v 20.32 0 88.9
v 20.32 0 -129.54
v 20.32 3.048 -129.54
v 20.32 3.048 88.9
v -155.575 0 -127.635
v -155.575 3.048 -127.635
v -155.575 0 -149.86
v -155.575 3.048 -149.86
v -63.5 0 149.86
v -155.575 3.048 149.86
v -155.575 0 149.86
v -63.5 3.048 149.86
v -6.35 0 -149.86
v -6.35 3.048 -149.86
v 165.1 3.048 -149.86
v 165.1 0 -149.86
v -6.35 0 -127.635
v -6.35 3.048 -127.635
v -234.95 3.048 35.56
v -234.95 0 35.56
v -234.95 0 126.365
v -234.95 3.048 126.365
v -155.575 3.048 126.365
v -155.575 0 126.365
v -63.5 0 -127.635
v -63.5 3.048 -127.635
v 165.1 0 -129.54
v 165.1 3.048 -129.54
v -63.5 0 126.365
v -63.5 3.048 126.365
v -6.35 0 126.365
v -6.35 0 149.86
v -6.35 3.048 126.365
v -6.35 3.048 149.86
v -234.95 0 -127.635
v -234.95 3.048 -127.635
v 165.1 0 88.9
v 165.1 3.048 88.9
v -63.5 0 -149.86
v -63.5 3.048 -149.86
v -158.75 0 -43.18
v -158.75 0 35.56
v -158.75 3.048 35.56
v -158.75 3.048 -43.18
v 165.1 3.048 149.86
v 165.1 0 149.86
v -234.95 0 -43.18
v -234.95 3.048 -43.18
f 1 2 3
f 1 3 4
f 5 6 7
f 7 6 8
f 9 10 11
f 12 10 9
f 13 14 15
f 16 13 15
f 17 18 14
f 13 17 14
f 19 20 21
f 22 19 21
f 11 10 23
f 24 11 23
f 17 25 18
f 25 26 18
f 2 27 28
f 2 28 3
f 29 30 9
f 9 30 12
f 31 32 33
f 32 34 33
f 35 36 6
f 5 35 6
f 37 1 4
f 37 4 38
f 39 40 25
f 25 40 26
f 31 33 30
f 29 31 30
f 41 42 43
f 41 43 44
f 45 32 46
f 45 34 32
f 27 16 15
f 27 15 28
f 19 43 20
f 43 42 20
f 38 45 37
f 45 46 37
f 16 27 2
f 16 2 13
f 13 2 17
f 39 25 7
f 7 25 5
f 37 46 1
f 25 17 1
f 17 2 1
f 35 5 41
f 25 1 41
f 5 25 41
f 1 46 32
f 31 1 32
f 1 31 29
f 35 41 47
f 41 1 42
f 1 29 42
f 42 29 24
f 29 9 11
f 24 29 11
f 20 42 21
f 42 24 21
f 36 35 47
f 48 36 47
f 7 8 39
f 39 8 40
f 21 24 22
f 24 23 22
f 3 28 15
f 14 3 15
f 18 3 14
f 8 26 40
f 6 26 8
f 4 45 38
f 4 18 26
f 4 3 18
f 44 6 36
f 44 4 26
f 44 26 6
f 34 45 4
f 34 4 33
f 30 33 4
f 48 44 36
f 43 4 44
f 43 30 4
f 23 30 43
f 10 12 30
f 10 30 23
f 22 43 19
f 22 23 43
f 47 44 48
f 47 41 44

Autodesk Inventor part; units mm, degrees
ref_plane "YZ Plane" through (0, 0, 0) normal (1, 0, 0) x (0, 1, 0)
ref_plane "XZ Plane" through (0, 0, 0) normal (0, 1, 0) x (-1, 0, 0)
ref_plane "XY Plane" through (0, 0, 0) normal (0, 0, 1) x (1, 0, 0)
sketch "Sketch1" plane through (0, 0, 0) normal (0, 1, 0) x (-1, 0, 0)
  line L0 (234.95, 355.6) -> (-234.95, 355.6)
  line L1 (-234.95, 355.6) -> (-234.95, -355.6)
  line L2 (-234.95, -355.6) -> (234.95, -355.6)
  line L3 (234.95, -355.6) -> (234.95, 355.6)
  line L4 (234.95, 355.6) -> (-234.95, -355.6) construction
  line L5 (-234.95, 355.6) -> (234.95, -355.6) construction
  point P0 (0, 0)
  dimension "d0" = 469.9
  dimension "d1" = 711.2
extrude "Plate1" add sketch "Sketch1" along normal blind 3.048
sketch "Sketch3" plane through (0, 3.048, 0) normal (0, 1, 0) x (1, 0, 0)
  line L0 (234.95, -355.6) -> (-234.95, -355.6) projected
  point P0 (0, 0)
sketch "Sketch4" plane through (0, 0, 0) normal (0, -1, 0) x (1, 0, 0)
  line L0 (-234.95, 355.6) -> (234.95, 355.6) projected
  line L1 (-234.95, -355.6) -> (-234.95, 355.6) projected
  line L2 (234.95, -355.6) -> (-234.95, -355.6) projected
  line L3 (234.95, 355.6) -> (234.95, -355.6) projected
  line L4 (-234.95, 355.6) -> (234.95, 355.6) projected
  line L5 (25.4, 355.6) -> (25.4, 294.64)
  line L6 (165.1, 101.6) -> (234.95, 101.6)
  line L7 (234.95, 355.6) -> (234.95, -355.6) projected
  line L8 (25.4, 294.64) -> (165.1, 154.94)
  line L9 (25.4, 294.64) -> (222.9656, 294.64) construction
  line L10 (165.1, 154.94) -> (165.1, 101.6)
  line L11 (234.95, 0) -> (-234.95, 0)
  line L12 (-234.95, -355.6) -> (-234.95, 355.6) projected
  line L13 (25.4, -355.6) -> (25.4, -294.64)
  line L14 (165.1, -127) -> (234.95, -127)
  line L15 (25.4, -294.64) -> (165.1, -154.94)
  line L16 (25.4, -294.64) -> (222.9656, -294.64) construction
  line L17 (165.1, -154.94) -> (165.1, -127)
  line L18 (-234.95, 184.15) -> (-120.65, 184.15)
  line L19 (-120.65, 184.15) -> (-120.65, 177.8)
  line L20 (-120.65, 177.8) -> (-222.25, 177.8)
  line L21 (-222.25, 177.8) -> (-222.25, 152.4)
  line L22 (-222.25, 152.4) -> (-234.95, 152.4)
  line L23 (-234.95, 149.86) -> (-219.71, 149.86)
  line L24 (-219.71, 149.86) -> (-219.71, 175.26)
  line L25 (-219.71, 175.26) -> (-118.11, 175.26)
  line L26 (-118.11, 175.26) -> (-118.11, 186.69)
  line L27 (-118.11, 186.69) -> (-234.95, 186.69)
  line L28 (165.1, -129.54) -> (20.32, -129.54)
  line L29 (20.32, -129.54) -> (20.32, 88.9)
  line L30 (20.32, 88.9) -> (165.1, 88.9)
  line L31 (165.1, 101.6) -> (165.1, 88.9)
  line L32 (-234.95, -184.15) -> (-120.65, -184.15)
  line L33 (-120.65, -184.15) -> (-120.65, -177.8)
  line L34 (-120.65, -177.8) -> (-222.25, -177.8)
  line L35 (-222.25, -177.8) -> (-222.25, -152.4)
  line L36 (-222.25, -152.4) -> (-234.95, -152.4)
  line L37 (-234.95, -149.86) -> (-219.71, -149.86)
  line L38 (-219.71, -149.86) -> (-219.71, -175.26)
  line L39 (-219.71, -175.26) -> (-118.11, -175.26)
  line L40 (-118.11, -175.26) -> (-118.11, -186.69)
  line L41 (-118.11, -186.69) -> (-234.95, -186.69)
  line L42 (-158.75, 35.56) -> (-158.75, -43.18)
  line L43 (-158.75, -43.18) -> (-234.95, -43.18)
  line L44 (-158.75, 35.56) -> (-234.95, 35.56)
  line L45 (25.4, 330.2) -> (6.35, 330.2)
  line L46 (6.35, 330.2) -> (6.35, 355.6)
  line L47 (25.4, -330.2) -> (6.35, -330.2)
  line L48 (6.35, -330.2) -> (6.35, -355.6)
  line L49 (234.95, -355.6) -> (-234.95, -355.6) projected
  point P0 (0, 0)
  dimension "d3" = 209.55
  dimension "d4" = 254
  dimension "d5" = 45
  dimension "d6" = 60.96
  dimension "d9" = 69.85
  dimension "d12" = 45
  dimension "d13" = 209.55
  dimension "d14" = 228.6
  dimension "d15" = 69.85
  dimension "d16" = 60.96
  dimension "d17" = 171.45
  dimension "d18" = 114.3
  dimension "d19" = 6.35
  dimension "d21" = 101.6
  dimension "d22" = 25.4
  dimension "d23" = 2.54
  dimension "d26" = 144.78
  dimension "d31" = 12.7
  dimension "d32" = 114.3
  dimension "d33" = 171.45
  dimension "d34" = 6.35
  dimension "d35" = 101.6
  dimension "d36" = 25.4
  dimension "d37" = 2.54
  dimension "d38" = 76.2
  dimension "d39" = 35.56
  dimension "d40" = 43.18
  dimension "d41" = 2.54
  dimension "d42" = 25.4
  dimension "d43" = 19.05
  dimension "d44" = 25.4
  dimension "d45" = 19.05
extrude "Cut1" cut sketch "Sketch4" against normal blind 3.048 contours L27 L26 L25 L24 L23 L1 L22 L21 L20 L19 L18 | L0 L3 L6 L10 L8 L5 | L18 L19 L20 L21 L22 L1 | L3 L11 L29 L30 L31 L6 | L3 L14 L17 L28 L29 L11 | L44 L42 L11 L1 | L3 L2 L13 L15 L17 L14 | L11 L42 L43 L1 | L37 L38 L39 L40 L41 L1 L32 L33 L34 L35 L36 | L36 L35 L34 L33 L32 L1
sketch "Sketch5" plane through (0, 0, 0) normal (0, -1, 0) x (1, 0, 0)
  line L0 (25.4, 355.6) -> (25.4, 294.64) projected
  line L1 (25.4, 294.64) -> (165.1, 154.94) projected
  line L2 (165.1, 154.94) -> (165.1, 88.9) projected
  line L3 (165.1, 88.9) -> (20.32, 88.9) projected
  line L4 (20.32, 88.9) -> (20.32, -129.54) projected
  line L5 (20.32, -129.54) -> (165.1, -129.54) projected
  line L6 (165.1, -129.54) -> (165.1, -154.94) projected
  line L7 (165.1, -154.94) -> (25.4, -294.64) projected
  line L8 (25.4, -294.64) -> (25.4, -355.6) projected
  line L9 (25.4, -355.6) -> (-234.95, -355.6) projected
  line L10 (-234.95, -355.6) -> (-234.95, -186.69) projected
  line L11 (-234.95, -186.69) -> (-118.11, -186.69) projected
  line L12 (-118.11, -186.69) -> (-118.11, -175.26) projected
  line L13 (-118.11, -175.26) -> (-219.71, -175.26) projected
  line L14 (-219.71, -175.26) -> (-219.71, -149.86) projected
  line L15 (-219.71, -149.86) -> (-234.95, -149.86) projected
  line L16 (-234.95, -149.86) -> (-234.95, -43.18) projected
  line L17 (-234.95, -43.18) -> (-158.75, -43.18) projected
  line L18 (-158.75, -43.18) -> (-158.75, 35.56) projected
  line L19 (-158.75, 35.56) -> (-234.95, 35.56) projected
  line L20 (-234.95, 35.56) -> (-234.95, 149.86) projected
  line L21 (-234.95, 149.86) -> (-219.71, 149.86) projected
  line L22 (-219.71, 149.86) -> (-219.71, 175.26) projected
  line L23 (-219.71, 175.26) -> (-118.11, 175.26) projected
  line L24 (-118.11, 175.26) -> (-118.11, 186.69) projected
  line L25 (-118.11, 186.69) -> (-234.95, 186.69) projected
  line L26 (-234.95, 186.69) -> (-234.95, 355.6) projected
  line L27 (-234.95, 355.6) -> (25.4, 355.6) projected
  line L28 (25.4, -355.6) -> (-234.95, -355.6) projected
  line L29 (25.4, -355.6) -> (6.35, -355.6)
  line L30 (6.35, -355.6) -> (6.35, -330.2)
  line L31 (6.35, -330.2) -> (25.4, -330.2)
  line L32 (25.4, -330.2) -> (25.4, -355.6)
  line L33 (-234.95, 355.6) -> (25.4, 355.6) projected
  line L34 (25.4, 355.6) -> (6.35, 355.6)
  line L35 (6.35, 355.6) -> (6.35, 330.2)
  line L36 (6.35, 330.2) -> (25.4, 330.2)
  line L37 (25.4, 330.2) -> (25.4, 355.6)
  line L38 (-146.05, -355.6) -> (-101.6, -355.6)
  line L39 (-101.6, -355.6) -> (-101.6, -330.2)
  line L40 (-101.6, -330.2) -> (-146.05, -330.2)
  line L41 (-146.05, -330.2) -> (-146.05, -355.6)
  line L42 (-146.05, 355.6) -> (-101.6, 355.6)
  line L43 (-101.6, 355.6) -> (-101.6, 330.2)
  line L44 (-101.6, 330.2) -> (-146.05, 330.2)
  line L45 (-146.05, 330.2) -> (-146.05, 355.6)
  point P0 (0, 0)
  dimension "d46" = 19.05
  dimension "d47" = 25.4
  dimension "d48" = 19.05
  dimension "d49" = 25.4
  dimension "d52" = 44.45
  dimension "d53" = 25.4
  dimension "d54" = 88.9
  dimension "d55" = 44.45
  dimension "d56" = 25.4
  dimension "d57" = 88.9
extrude "Cut2" cut sketch "Sketch5" against normal blind 3.048 contours L0 L36 L35 L27 | L43 L44 L45 L27 | L8 L9 L30 L31 | L9 L41 L40 L39
sketch "Sketch6" plane through (0, 3.048, 0) normal (0, 1, 0) x (1, 0, 0)
  line L0 (20.32, -88.9) -> (165.1, -88.9) projected
  line L1 (165.1, -88.9) -> (165.1, -154.94) projected
  line L2 (165.1, -154.94) -> (25.4, -294.64) projected
  line L3 (25.4, -294.64) -> (25.4, -330.2) projected
  line L4 (25.4, -330.2) -> (6.35, -330.2) projected
  line L5 (6.35, -330.2) -> (6.35, -355.6) projected
  line L6 (6.35, -355.6) -> (-101.6, -355.6) projected
  line L7 (-101.6, -355.6) -> (-101.6, -330.2) projected
  line L8 (-101.6, -330.2) -> (-146.05, -330.2) projected
  line L9 (-146.05, -330.2) -> (-146.05, -355.6) projected
  line L10 (-146.05, -355.6) -> (-234.95, -355.6) projected
  line L11 (-234.95, -355.6) -> (-234.95, -186.69) projected
  line L12 (-234.95, -186.69) -> (-118.11, -186.69) projected
  line L13 (-118.11, -186.69) -> (-118.11, -175.26) projected
  line L14 (-118.11, -175.26) -> (-219.71, -175.26) projected
  line L15 (-219.71, -175.26) -> (-219.71, -149.86) projected
  line L16 (-219.71, -149.86) -> (-234.95, -149.86) projected
  line L17 (-234.95, -149.86) -> (-234.95, -35.56) projected
  line L18 (-234.95, -35.56) -> (-158.75, -35.56) projected
  line L19 (-158.75, -35.56) -> (-158.75, 43.18) projected
  line L20 (-158.75, 43.18) -> (-234.95, 43.18) projected
  line L21 (-234.95, 43.18) -> (-234.95, 149.86) projected
  line L22 (-234.95, 149.86) -> (-219.71, 149.86) projected
  line L23 (-219.71, 149.86) -> (-219.71, 175.26) projected
  line L24 (-219.71, 175.26) -> (-118.11, 175.26) projected
  line L25 (-118.11, 175.26) -> (-118.11, 186.69) projected
  line L26 (-118.11, 186.69) -> (-234.95, 186.69) projected
  line L27 (-234.95, 186.69) -> (-234.95, 355.6) projected
  line L28 (-234.95, 355.6) -> (-146.05, 355.6) projected
  line L29 (-146.05, 355.6) -> (-146.05, 330.2) projected
  line L30 (-146.05, 330.2) -> (-101.6, 330.2) projected
  line L31 (-101.6, 330.2) -> (-101.6, 355.6) projected
  line L32 (-101.6, 355.6) -> (6.35, 355.6) projected
  line L33 (6.35, 355.6) -> (6.35, 330.2) projected
  line L34 (6.35, 330.2) -> (25.4, 330.2) projected
  line L35 (25.4, 330.2) -> (25.4, 294.64) projected
  line L36 (25.4, 294.64) -> (165.1, 154.94) projected
  line L37 (165.1, 154.94) -> (165.1, 129.54) projected
  line L38 (165.1, 129.54) -> (20.32, 129.54) projected
  line L39 (20.32, 129.54) -> (20.32, -88.9) projected
  line L40 (-234.95, -151.765) -> (-155.575, -151.765)
  line L41 (-155.575, -151.765) -> (-155.575, -126.365)
  line L42 (-155.575, -126.365) -> (-234.95, -126.365)
  line L43 (-234.95, -126.365) -> (-234.95, -151.765)
  line L44 (-234.95, -151.765) -> (-155.575, -126.365) construction
  line L45 (-155.575, -151.765) -> (-234.95, -126.365) construction
  line L46 (85.725, -151.765) -> (165.1, -151.765)
  line L47 (165.1, -151.765) -> (165.1, -126.365)
  line L48 (165.1, -126.365) -> (85.725, -126.365)
  line L49 (85.725, -126.365) -> (85.725, -151.765)
  line L50 (85.725, -151.765) -> (165.1, -126.365) construction
  line L51 (165.1, -151.765) -> (85.725, -126.365) construction
  line L52 (165.1, -154.94) -> (165.1, -88.9) projected
  line L53 (-234.95, -149.86) -> (-234.95, -35.56) projected
  line L54 (85.725, 127.635) -> (165.1, 127.635)
  line L55 (165.1, 127.635) -> (165.1, 153.035)
  line L56 (165.1, 153.035) -> (85.725, 153.035)
  line L57 (85.725, 153.035) -> (85.725, 127.635)
  line L58 (85.725, 127.635) -> (165.1, 153.035) construction
  line L59 (165.1, 127.635) -> (85.725, 153.035) construction
  line L60 (-63.5, 127.635) -> (-6.35, 127.635)
  line L61 (-6.35, 127.635) -> (-6.35, 153.035)
  line L62 (-6.35, 153.035) -> (-63.5, 153.035)
  line L63 (-63.5, 153.035) -> (-63.5, 127.635)
  line L64 (-63.5, 127.635) -> (-6.35, 153.035) construction
  line L65 (-6.35, 127.635) -> (-63.5, 153.035) construction
  line L66 (-63.5, -151.765) -> (-6.35, -151.765)
  line L67 (-6.35, -151.765) -> (-6.35, -126.365)
  line L68 (-6.35, -126.365) -> (-63.5, -126.365)
  line L69 (-63.5, -126.365) -> (-63.5, -151.765)
  line L70 (-63.5, -151.765) -> (-6.35, -126.365) construction
  line L71 (-6.35, -151.765) -> (-63.5, -126.365) construction
  line L72 (-195.2625, -139.065) -> (125.4125, -139.065) construction
  line L73 (-234.95, 127.635) -> (-155.575, 127.635)
  line L74 (-155.575, 127.635) -> (-155.575, 153.035)
  line L75 (-155.575, 153.035) -> (-234.95, 153.035)
  line L76 (-234.95, 153.035) -> (-234.95, 127.635)
  line L77 (-234.95, 127.635) -> (-155.575, 153.035) construction
  line L78 (-155.575, 127.635) -> (-234.95, 153.035) construction
  line L79 (-155.575, -151.765) -> (85.725, -151.765)
  line L80 (85.725, 153.035) -> (-155.575, 153.035)
  line L81 (-234.95, -35.56) -> (-234.95, -149.86) construction
  line L82 (-234.95, -149.86) -> (165.1, -149.86)
  line L83 (-234.95, 149.86) -> (165.1, 149.86)
  line L84 (165.1, 154.94) -> (165.1, 129.54) construction
  point P0 (0, 0)
  point P1 (125.4125, 140.335)
  point P2 (-34.925, 140.335)
  point P3 (-34.925, -139.065)
  point P4 (-34.925, -139.065)
  point P5 (-195.2625, 140.335)
  point P6 (-63.5, 153.035)
  point P7 (-6.35, 153.035)
  point P8 (-6.35, -151.765)
  point P9 (-63.5, -151.765)
  point P10 (-63.5, -149.86)
  point P11 (-155.575, -149.86)
  point P12 (-6.35, -149.86)
  point P13 (165.1, -149.86)
  point P14 (-6.35, 149.86)
  point P15 (-155.575, 149.86)
  point P16 (-63.5, 149.86)
  dimension "d58" = 25.4
  dimension "d59" = 3.175
  dimension "d60" = 79.375
  dimension "d61" = 57.15
  dimension "d62" = 279.4
extrude "Extrusion1" cut sketch "Sketch6" against normal through all contours L1 L46 L49 L82 | L83 L61 L80 L57 | L57 L56 L37 L83 | L1 L2 L3 L4 L5 L6 L7 L8 L9 L10 L11 L12 L13 L14 L15 L40 L79 L66 L46 | L49 L79 L67 L82 | L80 L62 L75 L23 L24 L25 L26 L27 L28 L29 L30 L31 L32 L33 L34 L35 L36 L37 L56 | L83 L63 L62 L61 | L61 L60 L63 L83 | L82 L69 L68 L67 | L67 L66 L69 L82 | L83 L74 L80 L63 | L69 L79 L41 L82 | L83 L23 L75 L74 | L74 L73 L21 L22 L83 | L82 L16 L17 L42 L41 | L41 L40 L15 L82
equation "\"d10\" = Thickness"
equation "\"d2\" = Thickness"
equation "\"BendRadius\" = Thickness"
equation "\"BendReliefWidth\" = Thickness"
equation "\"BendReliefDepth\" = 0.5 * Thickness"
equation "\"CornerReliefSize\" = 4 * Thickness"
equation "\"MinimumRemnant\" = 2 * Thickness"
equation "\"TransitionRadius\" = BendRadius"
equation "\"JacobiRadiusSize\" = BendRadius"
equation "\"GapSize\" = Thickness"
equation "\"Thickness\" = 3.048"
properties part number "DB1-020" material "Polycarbonate, Smoke"
